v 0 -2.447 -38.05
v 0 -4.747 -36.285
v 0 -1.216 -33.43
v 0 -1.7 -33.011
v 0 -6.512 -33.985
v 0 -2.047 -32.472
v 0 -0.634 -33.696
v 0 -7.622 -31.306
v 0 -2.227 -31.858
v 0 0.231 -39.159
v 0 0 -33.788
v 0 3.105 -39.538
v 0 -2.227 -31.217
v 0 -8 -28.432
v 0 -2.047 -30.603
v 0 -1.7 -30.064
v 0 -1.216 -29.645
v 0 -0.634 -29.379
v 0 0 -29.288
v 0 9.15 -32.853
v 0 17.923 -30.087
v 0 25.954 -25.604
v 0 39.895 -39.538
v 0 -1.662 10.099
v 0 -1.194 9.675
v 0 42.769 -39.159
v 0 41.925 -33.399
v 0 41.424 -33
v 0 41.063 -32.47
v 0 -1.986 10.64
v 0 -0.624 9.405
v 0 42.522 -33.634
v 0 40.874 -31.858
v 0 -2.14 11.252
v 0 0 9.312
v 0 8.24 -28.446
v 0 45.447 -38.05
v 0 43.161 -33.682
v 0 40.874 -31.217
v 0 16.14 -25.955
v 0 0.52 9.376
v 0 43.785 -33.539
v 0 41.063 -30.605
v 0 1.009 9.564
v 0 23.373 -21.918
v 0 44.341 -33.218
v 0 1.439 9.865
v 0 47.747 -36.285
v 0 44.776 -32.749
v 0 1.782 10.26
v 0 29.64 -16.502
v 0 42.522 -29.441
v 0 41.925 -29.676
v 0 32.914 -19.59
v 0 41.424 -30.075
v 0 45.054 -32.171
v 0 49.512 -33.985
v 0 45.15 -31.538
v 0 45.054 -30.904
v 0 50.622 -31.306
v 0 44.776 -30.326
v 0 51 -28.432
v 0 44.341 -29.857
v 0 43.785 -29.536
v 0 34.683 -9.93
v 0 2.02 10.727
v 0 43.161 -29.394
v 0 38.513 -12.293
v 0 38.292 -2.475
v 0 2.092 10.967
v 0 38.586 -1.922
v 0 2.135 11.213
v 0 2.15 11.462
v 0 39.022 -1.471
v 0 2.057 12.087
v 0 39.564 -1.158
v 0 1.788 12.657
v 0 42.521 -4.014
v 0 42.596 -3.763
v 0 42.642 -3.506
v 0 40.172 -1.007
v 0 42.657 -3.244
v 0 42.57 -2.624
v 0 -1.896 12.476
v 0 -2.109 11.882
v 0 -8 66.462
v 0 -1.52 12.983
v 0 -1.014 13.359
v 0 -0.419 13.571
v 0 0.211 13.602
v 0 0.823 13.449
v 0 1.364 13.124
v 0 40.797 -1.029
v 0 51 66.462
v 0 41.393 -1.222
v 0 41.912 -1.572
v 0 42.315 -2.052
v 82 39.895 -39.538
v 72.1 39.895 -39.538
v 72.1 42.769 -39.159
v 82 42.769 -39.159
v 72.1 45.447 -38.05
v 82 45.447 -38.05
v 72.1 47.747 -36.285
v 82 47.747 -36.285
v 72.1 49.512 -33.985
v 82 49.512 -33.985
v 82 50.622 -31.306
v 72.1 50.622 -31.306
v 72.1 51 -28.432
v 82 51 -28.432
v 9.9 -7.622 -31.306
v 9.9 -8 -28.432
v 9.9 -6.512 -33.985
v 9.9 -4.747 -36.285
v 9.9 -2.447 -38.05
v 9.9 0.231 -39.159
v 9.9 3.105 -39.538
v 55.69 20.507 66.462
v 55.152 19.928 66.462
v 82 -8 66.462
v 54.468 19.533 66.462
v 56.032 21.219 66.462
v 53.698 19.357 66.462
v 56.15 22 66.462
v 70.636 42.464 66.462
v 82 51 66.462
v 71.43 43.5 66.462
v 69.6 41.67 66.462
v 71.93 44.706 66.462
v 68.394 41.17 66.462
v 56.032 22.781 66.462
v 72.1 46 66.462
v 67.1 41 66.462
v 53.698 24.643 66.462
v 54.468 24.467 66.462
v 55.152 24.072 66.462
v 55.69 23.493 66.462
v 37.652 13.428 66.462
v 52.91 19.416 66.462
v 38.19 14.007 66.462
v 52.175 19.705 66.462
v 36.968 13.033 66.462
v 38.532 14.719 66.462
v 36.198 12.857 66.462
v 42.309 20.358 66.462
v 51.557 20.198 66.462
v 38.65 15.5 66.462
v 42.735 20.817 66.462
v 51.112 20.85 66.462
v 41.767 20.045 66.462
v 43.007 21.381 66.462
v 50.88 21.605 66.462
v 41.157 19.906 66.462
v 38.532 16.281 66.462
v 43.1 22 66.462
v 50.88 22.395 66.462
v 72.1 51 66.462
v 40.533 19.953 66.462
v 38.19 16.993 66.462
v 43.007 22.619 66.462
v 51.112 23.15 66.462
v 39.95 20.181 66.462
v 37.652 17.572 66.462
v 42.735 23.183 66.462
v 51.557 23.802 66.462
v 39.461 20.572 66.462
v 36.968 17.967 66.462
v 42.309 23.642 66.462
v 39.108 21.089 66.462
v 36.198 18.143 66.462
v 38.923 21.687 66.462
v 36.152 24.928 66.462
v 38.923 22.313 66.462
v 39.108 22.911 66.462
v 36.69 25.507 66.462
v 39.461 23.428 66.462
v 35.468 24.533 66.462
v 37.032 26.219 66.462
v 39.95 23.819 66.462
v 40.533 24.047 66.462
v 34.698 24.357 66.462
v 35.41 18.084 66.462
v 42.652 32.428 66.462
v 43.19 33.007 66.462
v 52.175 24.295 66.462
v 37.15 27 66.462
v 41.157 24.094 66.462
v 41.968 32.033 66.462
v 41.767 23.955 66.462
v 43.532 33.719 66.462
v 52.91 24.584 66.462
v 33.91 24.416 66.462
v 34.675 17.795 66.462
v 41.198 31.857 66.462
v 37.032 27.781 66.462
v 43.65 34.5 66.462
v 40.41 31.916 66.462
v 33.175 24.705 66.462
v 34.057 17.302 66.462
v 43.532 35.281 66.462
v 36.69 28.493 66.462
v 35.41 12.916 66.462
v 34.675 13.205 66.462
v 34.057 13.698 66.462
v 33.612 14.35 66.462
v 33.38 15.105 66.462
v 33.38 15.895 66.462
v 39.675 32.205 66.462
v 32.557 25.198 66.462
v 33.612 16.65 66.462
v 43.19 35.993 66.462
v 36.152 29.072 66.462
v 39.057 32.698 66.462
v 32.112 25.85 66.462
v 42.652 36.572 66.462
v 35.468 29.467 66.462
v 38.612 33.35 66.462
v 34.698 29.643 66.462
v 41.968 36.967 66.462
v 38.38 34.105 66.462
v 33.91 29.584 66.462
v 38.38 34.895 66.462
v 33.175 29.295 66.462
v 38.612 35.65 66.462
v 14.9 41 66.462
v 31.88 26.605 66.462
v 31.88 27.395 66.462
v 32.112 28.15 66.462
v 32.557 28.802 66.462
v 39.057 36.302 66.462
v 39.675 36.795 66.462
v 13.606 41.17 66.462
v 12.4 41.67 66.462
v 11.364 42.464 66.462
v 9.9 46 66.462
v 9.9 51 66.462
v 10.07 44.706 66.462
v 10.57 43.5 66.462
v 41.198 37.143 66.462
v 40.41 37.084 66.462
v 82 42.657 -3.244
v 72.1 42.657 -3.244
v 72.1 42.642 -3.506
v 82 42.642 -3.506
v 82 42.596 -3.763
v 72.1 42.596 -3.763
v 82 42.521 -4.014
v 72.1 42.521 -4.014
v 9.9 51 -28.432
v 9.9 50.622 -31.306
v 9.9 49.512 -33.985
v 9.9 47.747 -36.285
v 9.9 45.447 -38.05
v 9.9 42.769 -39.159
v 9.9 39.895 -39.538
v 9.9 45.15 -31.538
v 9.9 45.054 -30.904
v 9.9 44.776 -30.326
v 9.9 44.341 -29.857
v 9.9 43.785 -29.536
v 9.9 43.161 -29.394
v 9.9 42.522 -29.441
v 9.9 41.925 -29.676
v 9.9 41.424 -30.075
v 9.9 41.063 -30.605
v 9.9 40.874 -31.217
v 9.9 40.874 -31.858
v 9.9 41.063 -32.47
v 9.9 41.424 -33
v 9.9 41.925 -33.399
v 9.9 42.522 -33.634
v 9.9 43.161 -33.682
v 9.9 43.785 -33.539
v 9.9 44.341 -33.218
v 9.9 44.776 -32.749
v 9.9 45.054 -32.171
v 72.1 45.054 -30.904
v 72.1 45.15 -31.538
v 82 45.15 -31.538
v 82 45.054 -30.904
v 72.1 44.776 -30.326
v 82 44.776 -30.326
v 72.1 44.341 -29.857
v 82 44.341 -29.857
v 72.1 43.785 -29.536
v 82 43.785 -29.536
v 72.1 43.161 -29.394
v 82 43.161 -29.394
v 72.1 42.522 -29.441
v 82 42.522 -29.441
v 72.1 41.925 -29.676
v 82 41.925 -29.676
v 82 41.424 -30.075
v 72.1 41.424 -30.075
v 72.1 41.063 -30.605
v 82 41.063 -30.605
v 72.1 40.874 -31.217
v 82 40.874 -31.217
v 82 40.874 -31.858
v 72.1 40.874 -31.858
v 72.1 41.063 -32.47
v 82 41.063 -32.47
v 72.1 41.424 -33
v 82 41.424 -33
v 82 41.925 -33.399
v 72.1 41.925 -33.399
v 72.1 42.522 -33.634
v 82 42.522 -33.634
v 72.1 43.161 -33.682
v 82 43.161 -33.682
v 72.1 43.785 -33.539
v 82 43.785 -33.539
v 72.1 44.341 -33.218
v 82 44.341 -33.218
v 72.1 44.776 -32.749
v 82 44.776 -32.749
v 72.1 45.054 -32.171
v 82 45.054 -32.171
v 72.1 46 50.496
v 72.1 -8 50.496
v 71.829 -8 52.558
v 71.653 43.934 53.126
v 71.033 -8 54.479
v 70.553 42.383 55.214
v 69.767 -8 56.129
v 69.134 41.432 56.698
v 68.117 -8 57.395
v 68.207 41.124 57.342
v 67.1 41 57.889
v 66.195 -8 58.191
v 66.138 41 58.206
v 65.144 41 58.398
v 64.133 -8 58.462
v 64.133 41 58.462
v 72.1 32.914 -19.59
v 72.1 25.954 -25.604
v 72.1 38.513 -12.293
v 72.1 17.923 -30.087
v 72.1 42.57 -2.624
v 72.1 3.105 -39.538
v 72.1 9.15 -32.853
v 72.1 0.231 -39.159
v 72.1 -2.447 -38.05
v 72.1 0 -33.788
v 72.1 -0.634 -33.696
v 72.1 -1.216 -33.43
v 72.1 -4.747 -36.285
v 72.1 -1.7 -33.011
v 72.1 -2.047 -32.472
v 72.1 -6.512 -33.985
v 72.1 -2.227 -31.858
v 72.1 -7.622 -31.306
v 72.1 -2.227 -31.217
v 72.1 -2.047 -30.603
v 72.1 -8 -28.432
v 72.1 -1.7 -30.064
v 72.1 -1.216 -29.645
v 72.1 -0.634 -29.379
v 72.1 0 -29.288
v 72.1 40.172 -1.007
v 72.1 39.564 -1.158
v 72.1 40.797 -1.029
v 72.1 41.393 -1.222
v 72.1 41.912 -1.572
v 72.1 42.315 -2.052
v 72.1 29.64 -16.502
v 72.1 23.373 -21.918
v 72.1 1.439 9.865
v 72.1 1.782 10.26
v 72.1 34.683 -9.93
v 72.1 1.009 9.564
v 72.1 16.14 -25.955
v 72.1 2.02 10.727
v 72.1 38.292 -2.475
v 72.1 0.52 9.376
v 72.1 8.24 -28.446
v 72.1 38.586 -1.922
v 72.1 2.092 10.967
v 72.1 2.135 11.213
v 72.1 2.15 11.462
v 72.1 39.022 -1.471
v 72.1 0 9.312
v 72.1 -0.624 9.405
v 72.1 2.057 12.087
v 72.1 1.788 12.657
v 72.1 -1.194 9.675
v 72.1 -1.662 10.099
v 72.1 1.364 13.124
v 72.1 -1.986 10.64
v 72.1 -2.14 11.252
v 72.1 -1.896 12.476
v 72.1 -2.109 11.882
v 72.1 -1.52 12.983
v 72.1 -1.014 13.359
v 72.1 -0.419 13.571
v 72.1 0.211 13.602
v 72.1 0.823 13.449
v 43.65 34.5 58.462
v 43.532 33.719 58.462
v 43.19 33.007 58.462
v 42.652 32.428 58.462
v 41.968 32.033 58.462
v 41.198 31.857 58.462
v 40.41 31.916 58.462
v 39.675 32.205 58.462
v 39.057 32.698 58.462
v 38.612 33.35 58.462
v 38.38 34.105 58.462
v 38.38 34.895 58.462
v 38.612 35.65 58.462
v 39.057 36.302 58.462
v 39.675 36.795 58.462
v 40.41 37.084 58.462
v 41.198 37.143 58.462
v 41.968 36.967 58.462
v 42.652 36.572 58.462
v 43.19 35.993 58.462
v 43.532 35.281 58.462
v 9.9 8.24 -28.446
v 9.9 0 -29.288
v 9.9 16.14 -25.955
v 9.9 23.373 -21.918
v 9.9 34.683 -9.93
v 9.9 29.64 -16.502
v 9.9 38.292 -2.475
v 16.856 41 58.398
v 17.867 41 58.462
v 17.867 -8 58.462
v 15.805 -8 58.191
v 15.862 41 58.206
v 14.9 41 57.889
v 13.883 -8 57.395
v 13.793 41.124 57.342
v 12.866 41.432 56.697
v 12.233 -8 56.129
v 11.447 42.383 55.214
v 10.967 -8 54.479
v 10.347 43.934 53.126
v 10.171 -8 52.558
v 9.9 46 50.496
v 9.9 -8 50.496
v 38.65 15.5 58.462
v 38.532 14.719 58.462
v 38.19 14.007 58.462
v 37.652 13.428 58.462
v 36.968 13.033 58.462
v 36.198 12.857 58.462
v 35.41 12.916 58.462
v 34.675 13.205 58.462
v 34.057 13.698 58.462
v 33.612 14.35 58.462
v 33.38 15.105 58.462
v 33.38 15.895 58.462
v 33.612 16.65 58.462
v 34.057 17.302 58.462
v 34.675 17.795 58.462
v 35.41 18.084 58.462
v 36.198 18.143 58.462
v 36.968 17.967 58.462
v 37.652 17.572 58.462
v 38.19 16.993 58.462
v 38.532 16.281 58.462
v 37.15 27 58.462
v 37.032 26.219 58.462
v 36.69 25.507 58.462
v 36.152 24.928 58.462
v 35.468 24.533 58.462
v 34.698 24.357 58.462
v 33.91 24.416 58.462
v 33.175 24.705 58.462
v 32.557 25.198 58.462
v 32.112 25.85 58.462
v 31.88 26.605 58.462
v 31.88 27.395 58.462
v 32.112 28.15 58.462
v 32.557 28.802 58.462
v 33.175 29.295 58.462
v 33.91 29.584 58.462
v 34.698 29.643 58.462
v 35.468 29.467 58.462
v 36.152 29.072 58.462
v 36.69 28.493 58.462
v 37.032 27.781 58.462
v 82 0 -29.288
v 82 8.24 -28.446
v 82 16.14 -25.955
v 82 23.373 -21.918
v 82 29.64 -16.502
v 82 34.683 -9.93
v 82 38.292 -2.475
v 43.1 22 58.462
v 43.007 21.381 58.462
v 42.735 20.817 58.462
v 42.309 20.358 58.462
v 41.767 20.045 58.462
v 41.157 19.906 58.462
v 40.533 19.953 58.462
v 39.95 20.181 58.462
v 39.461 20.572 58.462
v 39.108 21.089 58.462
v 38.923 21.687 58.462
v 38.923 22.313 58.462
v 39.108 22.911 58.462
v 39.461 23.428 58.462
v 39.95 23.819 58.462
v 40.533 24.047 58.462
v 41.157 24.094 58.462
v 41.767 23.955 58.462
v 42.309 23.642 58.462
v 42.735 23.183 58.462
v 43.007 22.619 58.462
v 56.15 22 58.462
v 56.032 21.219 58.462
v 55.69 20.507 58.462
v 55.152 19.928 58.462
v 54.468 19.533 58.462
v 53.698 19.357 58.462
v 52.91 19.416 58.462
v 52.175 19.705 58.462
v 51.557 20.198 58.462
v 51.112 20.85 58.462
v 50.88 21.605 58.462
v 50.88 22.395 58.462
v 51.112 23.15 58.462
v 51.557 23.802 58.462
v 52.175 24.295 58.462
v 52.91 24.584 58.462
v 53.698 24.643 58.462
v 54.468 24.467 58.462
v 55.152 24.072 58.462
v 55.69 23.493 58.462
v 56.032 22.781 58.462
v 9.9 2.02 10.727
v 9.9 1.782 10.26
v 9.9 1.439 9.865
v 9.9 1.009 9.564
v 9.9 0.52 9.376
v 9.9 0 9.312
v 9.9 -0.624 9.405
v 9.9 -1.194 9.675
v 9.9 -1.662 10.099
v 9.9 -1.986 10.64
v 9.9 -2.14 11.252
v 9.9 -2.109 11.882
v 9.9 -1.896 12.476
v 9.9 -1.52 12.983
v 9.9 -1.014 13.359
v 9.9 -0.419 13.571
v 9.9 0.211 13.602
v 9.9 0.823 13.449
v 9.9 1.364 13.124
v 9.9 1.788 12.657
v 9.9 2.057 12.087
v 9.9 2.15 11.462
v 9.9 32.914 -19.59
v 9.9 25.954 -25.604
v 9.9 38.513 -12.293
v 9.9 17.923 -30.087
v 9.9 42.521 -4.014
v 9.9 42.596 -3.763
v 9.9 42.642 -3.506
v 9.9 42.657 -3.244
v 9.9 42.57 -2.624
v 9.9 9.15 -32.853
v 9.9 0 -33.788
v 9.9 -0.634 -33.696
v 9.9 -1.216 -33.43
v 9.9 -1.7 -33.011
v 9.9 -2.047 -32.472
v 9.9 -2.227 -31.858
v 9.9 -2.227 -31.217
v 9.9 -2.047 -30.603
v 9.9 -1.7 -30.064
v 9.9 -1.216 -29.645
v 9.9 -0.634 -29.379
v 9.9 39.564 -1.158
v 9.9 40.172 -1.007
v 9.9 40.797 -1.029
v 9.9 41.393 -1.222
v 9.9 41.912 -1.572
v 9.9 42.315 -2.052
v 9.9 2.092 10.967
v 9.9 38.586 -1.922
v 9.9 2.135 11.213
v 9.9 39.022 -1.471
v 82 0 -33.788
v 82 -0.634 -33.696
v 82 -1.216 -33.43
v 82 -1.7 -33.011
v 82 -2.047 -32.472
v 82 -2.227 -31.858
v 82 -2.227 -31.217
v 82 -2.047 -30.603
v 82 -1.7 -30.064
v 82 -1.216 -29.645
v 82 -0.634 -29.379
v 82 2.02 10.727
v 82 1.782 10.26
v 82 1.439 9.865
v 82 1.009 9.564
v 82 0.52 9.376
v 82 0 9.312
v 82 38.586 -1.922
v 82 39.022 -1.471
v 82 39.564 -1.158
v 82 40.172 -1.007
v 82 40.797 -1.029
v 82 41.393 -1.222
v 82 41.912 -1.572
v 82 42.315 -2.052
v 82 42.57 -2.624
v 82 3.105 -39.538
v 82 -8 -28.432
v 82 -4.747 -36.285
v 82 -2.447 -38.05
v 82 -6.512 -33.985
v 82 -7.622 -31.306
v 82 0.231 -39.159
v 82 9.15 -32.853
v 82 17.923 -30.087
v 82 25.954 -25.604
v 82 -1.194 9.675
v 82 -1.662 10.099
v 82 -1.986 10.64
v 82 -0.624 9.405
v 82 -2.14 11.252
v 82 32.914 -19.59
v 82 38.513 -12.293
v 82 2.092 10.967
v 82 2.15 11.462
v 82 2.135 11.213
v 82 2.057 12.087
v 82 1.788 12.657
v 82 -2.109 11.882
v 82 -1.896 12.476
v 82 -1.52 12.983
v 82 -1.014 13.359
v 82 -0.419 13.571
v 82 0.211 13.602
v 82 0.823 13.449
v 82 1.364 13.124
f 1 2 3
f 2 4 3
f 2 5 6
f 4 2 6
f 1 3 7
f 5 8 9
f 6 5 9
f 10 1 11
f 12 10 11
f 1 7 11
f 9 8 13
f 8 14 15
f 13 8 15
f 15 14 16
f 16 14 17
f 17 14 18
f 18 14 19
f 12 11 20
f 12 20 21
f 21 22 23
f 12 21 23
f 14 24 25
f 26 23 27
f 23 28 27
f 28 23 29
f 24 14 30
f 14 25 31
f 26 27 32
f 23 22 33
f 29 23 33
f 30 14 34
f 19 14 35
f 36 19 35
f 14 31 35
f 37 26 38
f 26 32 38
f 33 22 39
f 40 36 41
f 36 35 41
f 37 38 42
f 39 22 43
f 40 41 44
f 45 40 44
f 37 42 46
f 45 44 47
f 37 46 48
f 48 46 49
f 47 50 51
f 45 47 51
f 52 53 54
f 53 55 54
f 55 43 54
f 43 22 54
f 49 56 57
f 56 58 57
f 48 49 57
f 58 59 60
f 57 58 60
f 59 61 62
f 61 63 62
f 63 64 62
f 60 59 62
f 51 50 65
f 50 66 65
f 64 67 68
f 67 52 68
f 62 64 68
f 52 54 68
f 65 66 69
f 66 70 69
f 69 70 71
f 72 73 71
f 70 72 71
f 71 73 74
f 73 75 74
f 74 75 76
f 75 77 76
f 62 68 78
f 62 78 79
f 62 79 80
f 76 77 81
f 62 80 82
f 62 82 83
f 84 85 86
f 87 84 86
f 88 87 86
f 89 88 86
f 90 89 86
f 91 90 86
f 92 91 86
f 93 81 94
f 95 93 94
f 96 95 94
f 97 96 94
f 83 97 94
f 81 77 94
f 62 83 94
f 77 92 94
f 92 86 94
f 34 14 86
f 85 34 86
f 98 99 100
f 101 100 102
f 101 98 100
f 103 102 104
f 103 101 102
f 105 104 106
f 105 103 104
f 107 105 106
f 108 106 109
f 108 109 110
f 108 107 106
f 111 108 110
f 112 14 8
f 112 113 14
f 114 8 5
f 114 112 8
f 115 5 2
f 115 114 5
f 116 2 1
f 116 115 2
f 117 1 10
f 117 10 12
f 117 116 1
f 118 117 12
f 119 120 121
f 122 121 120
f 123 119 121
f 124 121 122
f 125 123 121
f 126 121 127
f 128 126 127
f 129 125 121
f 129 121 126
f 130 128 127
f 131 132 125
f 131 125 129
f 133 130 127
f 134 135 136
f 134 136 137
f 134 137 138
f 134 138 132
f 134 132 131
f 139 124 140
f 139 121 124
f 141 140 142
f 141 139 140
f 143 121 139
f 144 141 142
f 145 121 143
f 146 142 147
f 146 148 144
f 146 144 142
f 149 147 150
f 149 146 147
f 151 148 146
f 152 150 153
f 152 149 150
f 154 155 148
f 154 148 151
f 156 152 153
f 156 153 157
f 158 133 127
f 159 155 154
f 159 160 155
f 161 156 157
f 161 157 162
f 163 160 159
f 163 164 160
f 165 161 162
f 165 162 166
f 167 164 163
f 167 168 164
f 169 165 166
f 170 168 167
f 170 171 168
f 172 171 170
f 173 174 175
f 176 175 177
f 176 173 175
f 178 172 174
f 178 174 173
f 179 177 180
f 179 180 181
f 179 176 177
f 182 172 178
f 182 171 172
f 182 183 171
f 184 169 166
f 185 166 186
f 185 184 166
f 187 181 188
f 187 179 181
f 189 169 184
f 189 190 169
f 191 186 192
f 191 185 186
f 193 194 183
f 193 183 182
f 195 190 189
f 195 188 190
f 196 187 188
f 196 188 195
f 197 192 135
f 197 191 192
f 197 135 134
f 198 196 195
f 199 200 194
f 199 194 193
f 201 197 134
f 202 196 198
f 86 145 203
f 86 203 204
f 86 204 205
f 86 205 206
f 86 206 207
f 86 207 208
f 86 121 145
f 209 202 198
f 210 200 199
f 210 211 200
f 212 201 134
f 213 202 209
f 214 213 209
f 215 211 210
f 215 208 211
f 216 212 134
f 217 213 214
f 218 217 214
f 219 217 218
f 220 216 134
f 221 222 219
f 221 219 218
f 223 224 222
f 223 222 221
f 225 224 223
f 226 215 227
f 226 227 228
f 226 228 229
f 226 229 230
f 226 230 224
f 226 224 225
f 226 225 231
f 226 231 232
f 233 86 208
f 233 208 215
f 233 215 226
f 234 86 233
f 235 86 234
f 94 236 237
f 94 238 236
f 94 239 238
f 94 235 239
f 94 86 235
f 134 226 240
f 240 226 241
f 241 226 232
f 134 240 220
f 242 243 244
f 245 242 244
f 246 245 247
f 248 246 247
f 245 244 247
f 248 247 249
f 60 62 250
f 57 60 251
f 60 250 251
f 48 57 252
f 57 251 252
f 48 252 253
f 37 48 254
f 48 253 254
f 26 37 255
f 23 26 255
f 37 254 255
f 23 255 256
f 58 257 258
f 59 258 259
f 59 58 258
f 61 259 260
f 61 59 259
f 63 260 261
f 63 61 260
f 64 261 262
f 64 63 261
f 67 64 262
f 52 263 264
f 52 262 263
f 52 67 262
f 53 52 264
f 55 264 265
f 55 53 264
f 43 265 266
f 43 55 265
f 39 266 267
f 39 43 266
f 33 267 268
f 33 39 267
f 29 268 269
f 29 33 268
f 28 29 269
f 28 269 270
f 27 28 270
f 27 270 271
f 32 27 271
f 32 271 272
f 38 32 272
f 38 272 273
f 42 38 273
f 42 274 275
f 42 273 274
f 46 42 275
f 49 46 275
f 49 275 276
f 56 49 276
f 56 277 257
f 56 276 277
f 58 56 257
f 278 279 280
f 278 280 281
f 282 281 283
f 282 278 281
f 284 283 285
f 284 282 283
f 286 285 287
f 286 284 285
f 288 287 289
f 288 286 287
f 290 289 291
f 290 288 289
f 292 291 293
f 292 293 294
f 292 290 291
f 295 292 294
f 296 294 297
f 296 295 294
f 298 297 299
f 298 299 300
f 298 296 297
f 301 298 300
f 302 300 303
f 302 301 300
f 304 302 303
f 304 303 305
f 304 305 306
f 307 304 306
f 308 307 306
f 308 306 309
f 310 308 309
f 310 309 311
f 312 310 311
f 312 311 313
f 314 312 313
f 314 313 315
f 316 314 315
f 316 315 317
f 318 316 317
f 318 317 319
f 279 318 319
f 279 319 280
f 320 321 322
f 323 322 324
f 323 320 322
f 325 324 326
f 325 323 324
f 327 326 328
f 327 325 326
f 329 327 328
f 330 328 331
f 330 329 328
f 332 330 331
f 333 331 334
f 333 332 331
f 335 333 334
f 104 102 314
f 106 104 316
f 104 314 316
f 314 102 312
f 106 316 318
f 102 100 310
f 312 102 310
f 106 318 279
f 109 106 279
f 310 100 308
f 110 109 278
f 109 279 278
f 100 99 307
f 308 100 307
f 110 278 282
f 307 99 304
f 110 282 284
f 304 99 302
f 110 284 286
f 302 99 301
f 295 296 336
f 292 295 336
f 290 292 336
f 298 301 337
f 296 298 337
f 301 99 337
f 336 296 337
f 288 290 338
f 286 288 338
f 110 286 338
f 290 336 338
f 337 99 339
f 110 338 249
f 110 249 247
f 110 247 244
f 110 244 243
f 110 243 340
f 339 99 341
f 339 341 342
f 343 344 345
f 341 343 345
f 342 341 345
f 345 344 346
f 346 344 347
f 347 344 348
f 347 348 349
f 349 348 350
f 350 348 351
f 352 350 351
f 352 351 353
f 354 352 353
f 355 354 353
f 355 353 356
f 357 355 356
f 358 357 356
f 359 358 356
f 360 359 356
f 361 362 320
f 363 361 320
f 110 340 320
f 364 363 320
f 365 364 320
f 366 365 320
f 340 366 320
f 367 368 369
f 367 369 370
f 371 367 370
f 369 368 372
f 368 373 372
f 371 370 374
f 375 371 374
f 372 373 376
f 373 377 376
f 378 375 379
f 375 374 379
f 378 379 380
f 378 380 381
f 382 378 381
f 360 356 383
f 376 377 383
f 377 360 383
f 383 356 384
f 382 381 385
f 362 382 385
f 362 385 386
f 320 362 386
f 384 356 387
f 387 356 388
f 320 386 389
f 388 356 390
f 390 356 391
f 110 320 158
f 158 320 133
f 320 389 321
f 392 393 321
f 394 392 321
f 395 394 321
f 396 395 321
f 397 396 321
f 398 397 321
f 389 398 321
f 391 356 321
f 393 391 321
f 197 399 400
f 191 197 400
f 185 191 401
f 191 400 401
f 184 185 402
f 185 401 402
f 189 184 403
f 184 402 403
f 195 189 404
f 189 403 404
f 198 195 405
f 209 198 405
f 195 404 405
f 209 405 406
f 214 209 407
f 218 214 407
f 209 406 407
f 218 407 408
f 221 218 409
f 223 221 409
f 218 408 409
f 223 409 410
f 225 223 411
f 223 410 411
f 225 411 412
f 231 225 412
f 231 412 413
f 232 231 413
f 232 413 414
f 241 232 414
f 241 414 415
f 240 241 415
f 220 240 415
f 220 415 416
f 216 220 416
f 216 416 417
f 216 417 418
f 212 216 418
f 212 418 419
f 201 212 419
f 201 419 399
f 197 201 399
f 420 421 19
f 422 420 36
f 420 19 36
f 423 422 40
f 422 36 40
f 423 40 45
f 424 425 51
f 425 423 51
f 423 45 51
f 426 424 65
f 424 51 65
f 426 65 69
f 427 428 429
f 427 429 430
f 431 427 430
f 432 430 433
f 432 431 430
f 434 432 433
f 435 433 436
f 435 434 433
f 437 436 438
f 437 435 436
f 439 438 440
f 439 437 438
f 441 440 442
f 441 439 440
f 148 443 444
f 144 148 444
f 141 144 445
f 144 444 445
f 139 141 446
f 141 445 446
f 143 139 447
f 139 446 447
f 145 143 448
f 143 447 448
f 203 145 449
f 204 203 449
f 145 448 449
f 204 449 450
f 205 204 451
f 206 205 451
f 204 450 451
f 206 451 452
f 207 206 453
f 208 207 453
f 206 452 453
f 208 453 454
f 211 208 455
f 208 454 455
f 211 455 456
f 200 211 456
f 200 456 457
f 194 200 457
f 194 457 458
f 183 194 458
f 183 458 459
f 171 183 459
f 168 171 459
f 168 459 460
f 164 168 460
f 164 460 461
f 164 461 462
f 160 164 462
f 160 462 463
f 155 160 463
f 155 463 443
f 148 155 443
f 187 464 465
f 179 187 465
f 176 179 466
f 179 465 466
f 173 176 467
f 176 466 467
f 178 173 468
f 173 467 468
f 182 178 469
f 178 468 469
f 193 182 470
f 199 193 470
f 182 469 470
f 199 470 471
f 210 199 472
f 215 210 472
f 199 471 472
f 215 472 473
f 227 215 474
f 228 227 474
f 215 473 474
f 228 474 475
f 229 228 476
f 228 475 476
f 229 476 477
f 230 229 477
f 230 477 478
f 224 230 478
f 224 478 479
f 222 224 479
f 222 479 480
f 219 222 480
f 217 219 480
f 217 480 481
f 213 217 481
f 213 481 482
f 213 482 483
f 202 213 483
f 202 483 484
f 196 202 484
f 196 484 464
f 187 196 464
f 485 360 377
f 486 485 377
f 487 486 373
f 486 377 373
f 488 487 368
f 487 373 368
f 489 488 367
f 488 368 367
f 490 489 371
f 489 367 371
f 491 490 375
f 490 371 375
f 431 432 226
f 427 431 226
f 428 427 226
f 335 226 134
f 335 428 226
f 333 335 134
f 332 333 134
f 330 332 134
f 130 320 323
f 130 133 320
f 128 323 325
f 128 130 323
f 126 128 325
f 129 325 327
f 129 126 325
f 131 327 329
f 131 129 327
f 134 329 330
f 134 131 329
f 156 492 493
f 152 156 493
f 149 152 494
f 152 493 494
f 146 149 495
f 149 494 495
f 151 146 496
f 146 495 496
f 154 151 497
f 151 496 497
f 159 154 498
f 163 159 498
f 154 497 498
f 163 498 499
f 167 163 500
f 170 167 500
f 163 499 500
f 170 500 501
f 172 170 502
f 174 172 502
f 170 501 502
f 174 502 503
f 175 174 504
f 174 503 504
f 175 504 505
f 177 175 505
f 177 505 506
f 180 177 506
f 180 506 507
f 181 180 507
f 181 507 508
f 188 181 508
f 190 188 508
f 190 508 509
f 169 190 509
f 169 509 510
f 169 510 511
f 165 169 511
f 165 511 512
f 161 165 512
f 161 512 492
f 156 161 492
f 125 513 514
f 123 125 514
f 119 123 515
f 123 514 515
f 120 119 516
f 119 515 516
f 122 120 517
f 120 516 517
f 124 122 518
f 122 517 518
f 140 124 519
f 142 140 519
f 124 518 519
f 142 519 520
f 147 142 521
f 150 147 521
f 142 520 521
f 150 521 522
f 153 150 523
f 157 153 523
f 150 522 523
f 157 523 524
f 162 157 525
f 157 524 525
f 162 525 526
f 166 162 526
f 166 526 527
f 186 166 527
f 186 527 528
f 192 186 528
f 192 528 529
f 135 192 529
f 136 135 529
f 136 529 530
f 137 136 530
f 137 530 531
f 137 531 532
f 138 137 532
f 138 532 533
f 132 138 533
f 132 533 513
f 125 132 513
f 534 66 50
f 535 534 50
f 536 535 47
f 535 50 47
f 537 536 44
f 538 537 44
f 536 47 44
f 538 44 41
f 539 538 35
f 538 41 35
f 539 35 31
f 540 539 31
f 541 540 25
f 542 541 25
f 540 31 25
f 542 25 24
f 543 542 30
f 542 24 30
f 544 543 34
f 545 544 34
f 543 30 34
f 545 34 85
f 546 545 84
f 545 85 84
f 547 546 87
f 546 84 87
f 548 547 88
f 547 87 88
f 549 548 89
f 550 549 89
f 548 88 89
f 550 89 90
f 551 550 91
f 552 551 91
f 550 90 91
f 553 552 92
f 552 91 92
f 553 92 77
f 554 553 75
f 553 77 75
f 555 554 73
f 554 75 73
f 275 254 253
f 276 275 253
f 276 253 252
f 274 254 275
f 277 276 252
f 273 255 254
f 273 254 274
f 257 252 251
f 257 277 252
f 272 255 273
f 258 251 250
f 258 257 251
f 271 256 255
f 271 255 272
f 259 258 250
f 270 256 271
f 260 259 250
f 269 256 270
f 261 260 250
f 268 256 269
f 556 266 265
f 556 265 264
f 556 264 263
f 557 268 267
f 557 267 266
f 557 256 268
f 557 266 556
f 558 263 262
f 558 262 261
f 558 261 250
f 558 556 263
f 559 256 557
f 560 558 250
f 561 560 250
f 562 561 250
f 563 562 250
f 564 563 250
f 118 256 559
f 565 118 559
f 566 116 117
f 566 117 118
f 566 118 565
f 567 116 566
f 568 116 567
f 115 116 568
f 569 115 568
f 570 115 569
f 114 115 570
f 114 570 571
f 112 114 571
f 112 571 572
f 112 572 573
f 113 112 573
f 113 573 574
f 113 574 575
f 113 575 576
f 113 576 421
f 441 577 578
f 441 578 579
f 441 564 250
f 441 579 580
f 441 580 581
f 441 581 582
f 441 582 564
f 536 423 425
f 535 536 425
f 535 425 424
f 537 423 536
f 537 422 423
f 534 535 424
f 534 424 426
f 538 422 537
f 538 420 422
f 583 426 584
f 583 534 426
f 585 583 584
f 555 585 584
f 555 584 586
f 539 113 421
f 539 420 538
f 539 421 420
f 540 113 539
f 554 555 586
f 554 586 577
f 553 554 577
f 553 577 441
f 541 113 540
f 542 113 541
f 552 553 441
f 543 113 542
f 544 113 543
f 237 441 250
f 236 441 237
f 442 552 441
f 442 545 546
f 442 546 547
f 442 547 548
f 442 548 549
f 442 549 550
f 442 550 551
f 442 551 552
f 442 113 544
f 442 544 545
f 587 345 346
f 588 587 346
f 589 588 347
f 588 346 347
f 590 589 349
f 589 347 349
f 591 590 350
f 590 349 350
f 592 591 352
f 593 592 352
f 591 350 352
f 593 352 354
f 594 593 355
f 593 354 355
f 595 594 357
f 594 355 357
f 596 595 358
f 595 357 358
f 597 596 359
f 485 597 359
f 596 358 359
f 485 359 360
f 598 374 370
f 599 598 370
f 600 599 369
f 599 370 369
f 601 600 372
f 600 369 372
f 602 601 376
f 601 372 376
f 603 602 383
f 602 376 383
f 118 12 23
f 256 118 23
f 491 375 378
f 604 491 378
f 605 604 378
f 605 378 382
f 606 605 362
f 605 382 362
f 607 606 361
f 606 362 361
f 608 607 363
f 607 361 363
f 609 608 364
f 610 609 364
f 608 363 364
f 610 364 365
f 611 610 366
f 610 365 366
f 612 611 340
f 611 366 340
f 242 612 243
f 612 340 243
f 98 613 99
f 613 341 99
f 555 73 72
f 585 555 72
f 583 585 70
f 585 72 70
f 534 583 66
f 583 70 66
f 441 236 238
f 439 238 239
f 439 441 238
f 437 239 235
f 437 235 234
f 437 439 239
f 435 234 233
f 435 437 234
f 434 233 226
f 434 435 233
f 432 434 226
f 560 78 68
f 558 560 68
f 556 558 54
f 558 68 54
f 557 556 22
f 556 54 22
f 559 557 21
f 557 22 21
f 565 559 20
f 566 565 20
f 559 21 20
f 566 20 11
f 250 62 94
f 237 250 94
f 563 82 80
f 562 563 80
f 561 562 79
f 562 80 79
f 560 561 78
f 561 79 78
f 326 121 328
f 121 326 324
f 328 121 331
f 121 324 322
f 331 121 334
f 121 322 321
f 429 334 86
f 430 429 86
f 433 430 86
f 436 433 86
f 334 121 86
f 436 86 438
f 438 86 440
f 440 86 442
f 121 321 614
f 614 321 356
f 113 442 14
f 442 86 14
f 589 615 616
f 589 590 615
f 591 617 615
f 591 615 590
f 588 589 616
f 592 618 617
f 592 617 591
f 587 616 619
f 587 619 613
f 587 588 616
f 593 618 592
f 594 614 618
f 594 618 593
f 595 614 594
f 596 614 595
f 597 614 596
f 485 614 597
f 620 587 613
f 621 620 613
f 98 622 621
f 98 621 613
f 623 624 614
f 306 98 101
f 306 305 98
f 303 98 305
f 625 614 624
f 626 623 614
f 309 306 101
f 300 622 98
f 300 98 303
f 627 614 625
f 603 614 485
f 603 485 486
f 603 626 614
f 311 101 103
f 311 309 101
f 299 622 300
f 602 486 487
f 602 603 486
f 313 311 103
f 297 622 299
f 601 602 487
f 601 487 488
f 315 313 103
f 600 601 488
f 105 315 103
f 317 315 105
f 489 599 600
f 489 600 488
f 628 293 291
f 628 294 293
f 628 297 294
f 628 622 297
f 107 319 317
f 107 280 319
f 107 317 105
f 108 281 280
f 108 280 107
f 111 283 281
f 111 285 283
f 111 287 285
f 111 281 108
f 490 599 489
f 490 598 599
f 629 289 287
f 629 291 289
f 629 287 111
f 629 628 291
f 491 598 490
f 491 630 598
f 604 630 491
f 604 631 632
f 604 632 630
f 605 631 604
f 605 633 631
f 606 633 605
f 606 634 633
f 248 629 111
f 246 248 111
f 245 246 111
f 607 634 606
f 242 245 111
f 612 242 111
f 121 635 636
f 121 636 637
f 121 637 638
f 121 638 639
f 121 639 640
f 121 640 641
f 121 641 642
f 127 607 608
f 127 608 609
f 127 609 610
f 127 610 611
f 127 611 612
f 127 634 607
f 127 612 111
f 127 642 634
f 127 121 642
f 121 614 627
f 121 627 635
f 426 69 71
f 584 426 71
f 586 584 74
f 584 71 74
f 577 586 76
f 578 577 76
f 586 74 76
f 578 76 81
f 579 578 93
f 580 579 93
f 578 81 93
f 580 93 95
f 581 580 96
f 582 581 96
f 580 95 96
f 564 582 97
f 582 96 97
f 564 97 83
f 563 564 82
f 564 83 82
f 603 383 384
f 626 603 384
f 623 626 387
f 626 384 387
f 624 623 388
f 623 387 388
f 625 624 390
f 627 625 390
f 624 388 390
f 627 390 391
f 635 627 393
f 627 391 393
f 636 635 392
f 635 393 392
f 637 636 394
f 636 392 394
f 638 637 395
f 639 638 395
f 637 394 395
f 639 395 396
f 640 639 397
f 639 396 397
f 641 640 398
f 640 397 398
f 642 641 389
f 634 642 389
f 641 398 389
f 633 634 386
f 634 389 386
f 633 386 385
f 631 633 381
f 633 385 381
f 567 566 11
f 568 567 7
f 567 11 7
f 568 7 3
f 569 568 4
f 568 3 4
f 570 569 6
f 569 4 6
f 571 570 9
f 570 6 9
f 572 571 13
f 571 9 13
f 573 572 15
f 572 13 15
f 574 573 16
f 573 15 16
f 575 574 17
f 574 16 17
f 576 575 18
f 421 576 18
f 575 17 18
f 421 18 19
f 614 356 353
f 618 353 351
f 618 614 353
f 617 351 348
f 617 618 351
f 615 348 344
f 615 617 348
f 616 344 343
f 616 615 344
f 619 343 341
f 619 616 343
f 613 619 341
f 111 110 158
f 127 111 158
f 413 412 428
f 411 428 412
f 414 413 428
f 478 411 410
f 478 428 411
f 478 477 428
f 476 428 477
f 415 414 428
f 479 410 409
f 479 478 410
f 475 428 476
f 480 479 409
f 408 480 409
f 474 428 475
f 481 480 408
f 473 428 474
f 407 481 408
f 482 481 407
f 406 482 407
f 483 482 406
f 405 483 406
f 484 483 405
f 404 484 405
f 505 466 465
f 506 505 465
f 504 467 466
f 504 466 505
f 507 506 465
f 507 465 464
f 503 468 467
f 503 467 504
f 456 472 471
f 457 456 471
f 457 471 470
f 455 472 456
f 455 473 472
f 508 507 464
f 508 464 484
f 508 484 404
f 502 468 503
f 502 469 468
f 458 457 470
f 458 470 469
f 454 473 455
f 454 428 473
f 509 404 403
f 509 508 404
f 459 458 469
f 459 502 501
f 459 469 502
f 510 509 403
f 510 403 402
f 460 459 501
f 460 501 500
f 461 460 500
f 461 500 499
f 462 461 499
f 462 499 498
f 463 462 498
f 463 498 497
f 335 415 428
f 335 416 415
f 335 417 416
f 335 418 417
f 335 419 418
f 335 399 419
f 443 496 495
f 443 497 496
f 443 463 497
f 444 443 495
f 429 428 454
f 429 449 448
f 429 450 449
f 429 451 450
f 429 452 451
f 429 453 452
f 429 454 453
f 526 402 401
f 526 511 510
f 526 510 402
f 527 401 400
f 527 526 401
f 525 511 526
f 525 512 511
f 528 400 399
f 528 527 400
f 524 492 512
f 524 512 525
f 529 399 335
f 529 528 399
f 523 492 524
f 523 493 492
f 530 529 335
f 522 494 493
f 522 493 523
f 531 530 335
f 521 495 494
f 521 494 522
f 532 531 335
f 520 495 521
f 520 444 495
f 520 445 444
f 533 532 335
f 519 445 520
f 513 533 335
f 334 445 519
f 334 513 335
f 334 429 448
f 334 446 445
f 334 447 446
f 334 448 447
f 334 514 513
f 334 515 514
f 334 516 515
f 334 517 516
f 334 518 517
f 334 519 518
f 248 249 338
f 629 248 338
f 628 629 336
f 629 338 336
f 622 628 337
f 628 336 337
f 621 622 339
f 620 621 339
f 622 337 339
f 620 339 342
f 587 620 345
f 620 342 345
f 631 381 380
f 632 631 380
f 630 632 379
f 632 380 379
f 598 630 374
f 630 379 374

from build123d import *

# Parameters (mm, degrees)
F0_W     = 59
F0_H     = 8
F0_H_2   = 98
F0_R     = 2.15
F1_DEPTH = 82
F2_W     = 62.2
F2_H     = 98
F3_DEPTH = 25
F4_DEPTH = 125.3
F5_R     = 2.1
F5_R_2   = 2.65
F5_W     = 62.2
F5_H     = 10
F6_DEPTH = 20.8
F7_R     = 7.9669047558
F8_R     = 11.1053823869
F9_R     = 5


with BuildPart() as f1:
    # F0 (on Right) → F1 (new body)
    with BuildSketch(Plane.YZ):
        with Locations((21.5, 62.4624560177)):
            Rectangle(F0_W, F0_H)
        with Locations((21.5, 9.4624560177)):
            Rectangle(F0_W, F0_H_2)
        with BuildLine():
            ThreePointArc((0, -33.7875439823), (-2.25, -31.5375439823), (0, -29.2875439823))
            Line((0, -29.2875439823), (0, 9.3124560177))
            ThreePointArc((0, 9.3124560177), (-1.5202795796, 12.9827355973), (2.15, 11.4624560177))
            ThreePointArc((2.15, 11.4624560177), (2.117336669, 11.0891124357), (2.0203391347, 10.7271127096))
            Line((2.0203391347, 10.7271127096), (38.292474297, -2.4748648228))
            ThreePointArc((38.292474297, -2.4748648228), (40.7974910935, -1.028592701), (42.6567826938, -3.2444101453))
            ThreePointArc((42.6567826938, -3.2444101453), (42.6226001381, -3.635118545), (42.5210910906, -4.0139554678))
            ThreePointArc((42.5210910906, -4.0139554678), (25.9543337449, -25.6041739863), (0, -33.7875439823))
        make_face(mode=Mode.SUBTRACT)
        with Locations((43, -31.5375439823)):
            Circle(F0_R, mode=Mode.SUBTRACT)
        with BuildLine():
            Line((0, 9.3124560177), (0, -29.2875439823))
            ThreePointArc((0, -29.2875439823), (23.3732397813, -21.917989787), (38.292474297, -2.4748648228))
            Line((38.292474297, -2.4748648228), (2.0203391347, 10.7271127096))
            ThreePointArc((2.0203391347, 10.7271127096), (1.2331893382, 9.7012791225), (0, 9.3124560177))
        make_face()
    extrude(amount=F1_DEPTH)

    # F2 (on face) → F3 (join)
    with BuildSketch(Plane.XZ.offset(8)):
        with Locations((41, 9.4624560177)):
            Rectangle(F2_W, F2_H)
    extrude(amount=F3_DEPTH)

    # F4 (cut): a face of the model
    f4_faces = [f1.faces().sort_by_distance(p)[0] for p in [
        (41, -33, 9.4624560177),
    ]]
    extrude(f4_faces, amount=-F4_DEPTH, mode=Mode.SUBTRACT)

    # F5 (on face) → F6 (cut)
    with BuildSketch(Plane(origin=(0, 0, 58.4624560177), x_dir=(1, 0, 0), z_dir=(0, 0, -1))):
        with Locations((41, -22)):
            Circle(F5_R)
        with Locations((53.5, -22)):
            Circle(F5_R_2)
        with Locations((34.5, -27)):
            Circle(F5_R_2)
        with Locations((36, -15.5)):
            Circle(F5_R_2)
        with Locations((41, -34.5)):
            Circle(F5_R_2)
        with Locations((41, -46)):
            Rectangle(F5_W, F5_H)
    extrude(amount=-F6_DEPTH, mode=Mode.SUBTRACT)

    # F7
    f7_edges = [f1.edges().sort_by_distance(p)[0] for p in [
        (9.9, 16.5, 58.462456),
        (72.1, 16.5, 58.462456),
    ]]
    fillet(f7_edges, radius=F7_R)

    # F8
    f8_edges = [f1.edges().sort_by_distance(p)[0] for p in [
        (4.95, -8, -39.537544),
        (4.95, 51, -39.537544),
        (77.05, 51, -39.537544),
        (77.05, -8, -39.537544),
    ]]
    fillet(f8_edges, radius=F8_R)

    # F9
    f9_edges = [f1.edges().sort_by_distance(p)[0] for p in [
        (9.9, 41, 62.462456),
        (72.1, 41, 62.462456),
    ]]
    fillet(f9_edges, radius=F9_R)


solid = f1.part
